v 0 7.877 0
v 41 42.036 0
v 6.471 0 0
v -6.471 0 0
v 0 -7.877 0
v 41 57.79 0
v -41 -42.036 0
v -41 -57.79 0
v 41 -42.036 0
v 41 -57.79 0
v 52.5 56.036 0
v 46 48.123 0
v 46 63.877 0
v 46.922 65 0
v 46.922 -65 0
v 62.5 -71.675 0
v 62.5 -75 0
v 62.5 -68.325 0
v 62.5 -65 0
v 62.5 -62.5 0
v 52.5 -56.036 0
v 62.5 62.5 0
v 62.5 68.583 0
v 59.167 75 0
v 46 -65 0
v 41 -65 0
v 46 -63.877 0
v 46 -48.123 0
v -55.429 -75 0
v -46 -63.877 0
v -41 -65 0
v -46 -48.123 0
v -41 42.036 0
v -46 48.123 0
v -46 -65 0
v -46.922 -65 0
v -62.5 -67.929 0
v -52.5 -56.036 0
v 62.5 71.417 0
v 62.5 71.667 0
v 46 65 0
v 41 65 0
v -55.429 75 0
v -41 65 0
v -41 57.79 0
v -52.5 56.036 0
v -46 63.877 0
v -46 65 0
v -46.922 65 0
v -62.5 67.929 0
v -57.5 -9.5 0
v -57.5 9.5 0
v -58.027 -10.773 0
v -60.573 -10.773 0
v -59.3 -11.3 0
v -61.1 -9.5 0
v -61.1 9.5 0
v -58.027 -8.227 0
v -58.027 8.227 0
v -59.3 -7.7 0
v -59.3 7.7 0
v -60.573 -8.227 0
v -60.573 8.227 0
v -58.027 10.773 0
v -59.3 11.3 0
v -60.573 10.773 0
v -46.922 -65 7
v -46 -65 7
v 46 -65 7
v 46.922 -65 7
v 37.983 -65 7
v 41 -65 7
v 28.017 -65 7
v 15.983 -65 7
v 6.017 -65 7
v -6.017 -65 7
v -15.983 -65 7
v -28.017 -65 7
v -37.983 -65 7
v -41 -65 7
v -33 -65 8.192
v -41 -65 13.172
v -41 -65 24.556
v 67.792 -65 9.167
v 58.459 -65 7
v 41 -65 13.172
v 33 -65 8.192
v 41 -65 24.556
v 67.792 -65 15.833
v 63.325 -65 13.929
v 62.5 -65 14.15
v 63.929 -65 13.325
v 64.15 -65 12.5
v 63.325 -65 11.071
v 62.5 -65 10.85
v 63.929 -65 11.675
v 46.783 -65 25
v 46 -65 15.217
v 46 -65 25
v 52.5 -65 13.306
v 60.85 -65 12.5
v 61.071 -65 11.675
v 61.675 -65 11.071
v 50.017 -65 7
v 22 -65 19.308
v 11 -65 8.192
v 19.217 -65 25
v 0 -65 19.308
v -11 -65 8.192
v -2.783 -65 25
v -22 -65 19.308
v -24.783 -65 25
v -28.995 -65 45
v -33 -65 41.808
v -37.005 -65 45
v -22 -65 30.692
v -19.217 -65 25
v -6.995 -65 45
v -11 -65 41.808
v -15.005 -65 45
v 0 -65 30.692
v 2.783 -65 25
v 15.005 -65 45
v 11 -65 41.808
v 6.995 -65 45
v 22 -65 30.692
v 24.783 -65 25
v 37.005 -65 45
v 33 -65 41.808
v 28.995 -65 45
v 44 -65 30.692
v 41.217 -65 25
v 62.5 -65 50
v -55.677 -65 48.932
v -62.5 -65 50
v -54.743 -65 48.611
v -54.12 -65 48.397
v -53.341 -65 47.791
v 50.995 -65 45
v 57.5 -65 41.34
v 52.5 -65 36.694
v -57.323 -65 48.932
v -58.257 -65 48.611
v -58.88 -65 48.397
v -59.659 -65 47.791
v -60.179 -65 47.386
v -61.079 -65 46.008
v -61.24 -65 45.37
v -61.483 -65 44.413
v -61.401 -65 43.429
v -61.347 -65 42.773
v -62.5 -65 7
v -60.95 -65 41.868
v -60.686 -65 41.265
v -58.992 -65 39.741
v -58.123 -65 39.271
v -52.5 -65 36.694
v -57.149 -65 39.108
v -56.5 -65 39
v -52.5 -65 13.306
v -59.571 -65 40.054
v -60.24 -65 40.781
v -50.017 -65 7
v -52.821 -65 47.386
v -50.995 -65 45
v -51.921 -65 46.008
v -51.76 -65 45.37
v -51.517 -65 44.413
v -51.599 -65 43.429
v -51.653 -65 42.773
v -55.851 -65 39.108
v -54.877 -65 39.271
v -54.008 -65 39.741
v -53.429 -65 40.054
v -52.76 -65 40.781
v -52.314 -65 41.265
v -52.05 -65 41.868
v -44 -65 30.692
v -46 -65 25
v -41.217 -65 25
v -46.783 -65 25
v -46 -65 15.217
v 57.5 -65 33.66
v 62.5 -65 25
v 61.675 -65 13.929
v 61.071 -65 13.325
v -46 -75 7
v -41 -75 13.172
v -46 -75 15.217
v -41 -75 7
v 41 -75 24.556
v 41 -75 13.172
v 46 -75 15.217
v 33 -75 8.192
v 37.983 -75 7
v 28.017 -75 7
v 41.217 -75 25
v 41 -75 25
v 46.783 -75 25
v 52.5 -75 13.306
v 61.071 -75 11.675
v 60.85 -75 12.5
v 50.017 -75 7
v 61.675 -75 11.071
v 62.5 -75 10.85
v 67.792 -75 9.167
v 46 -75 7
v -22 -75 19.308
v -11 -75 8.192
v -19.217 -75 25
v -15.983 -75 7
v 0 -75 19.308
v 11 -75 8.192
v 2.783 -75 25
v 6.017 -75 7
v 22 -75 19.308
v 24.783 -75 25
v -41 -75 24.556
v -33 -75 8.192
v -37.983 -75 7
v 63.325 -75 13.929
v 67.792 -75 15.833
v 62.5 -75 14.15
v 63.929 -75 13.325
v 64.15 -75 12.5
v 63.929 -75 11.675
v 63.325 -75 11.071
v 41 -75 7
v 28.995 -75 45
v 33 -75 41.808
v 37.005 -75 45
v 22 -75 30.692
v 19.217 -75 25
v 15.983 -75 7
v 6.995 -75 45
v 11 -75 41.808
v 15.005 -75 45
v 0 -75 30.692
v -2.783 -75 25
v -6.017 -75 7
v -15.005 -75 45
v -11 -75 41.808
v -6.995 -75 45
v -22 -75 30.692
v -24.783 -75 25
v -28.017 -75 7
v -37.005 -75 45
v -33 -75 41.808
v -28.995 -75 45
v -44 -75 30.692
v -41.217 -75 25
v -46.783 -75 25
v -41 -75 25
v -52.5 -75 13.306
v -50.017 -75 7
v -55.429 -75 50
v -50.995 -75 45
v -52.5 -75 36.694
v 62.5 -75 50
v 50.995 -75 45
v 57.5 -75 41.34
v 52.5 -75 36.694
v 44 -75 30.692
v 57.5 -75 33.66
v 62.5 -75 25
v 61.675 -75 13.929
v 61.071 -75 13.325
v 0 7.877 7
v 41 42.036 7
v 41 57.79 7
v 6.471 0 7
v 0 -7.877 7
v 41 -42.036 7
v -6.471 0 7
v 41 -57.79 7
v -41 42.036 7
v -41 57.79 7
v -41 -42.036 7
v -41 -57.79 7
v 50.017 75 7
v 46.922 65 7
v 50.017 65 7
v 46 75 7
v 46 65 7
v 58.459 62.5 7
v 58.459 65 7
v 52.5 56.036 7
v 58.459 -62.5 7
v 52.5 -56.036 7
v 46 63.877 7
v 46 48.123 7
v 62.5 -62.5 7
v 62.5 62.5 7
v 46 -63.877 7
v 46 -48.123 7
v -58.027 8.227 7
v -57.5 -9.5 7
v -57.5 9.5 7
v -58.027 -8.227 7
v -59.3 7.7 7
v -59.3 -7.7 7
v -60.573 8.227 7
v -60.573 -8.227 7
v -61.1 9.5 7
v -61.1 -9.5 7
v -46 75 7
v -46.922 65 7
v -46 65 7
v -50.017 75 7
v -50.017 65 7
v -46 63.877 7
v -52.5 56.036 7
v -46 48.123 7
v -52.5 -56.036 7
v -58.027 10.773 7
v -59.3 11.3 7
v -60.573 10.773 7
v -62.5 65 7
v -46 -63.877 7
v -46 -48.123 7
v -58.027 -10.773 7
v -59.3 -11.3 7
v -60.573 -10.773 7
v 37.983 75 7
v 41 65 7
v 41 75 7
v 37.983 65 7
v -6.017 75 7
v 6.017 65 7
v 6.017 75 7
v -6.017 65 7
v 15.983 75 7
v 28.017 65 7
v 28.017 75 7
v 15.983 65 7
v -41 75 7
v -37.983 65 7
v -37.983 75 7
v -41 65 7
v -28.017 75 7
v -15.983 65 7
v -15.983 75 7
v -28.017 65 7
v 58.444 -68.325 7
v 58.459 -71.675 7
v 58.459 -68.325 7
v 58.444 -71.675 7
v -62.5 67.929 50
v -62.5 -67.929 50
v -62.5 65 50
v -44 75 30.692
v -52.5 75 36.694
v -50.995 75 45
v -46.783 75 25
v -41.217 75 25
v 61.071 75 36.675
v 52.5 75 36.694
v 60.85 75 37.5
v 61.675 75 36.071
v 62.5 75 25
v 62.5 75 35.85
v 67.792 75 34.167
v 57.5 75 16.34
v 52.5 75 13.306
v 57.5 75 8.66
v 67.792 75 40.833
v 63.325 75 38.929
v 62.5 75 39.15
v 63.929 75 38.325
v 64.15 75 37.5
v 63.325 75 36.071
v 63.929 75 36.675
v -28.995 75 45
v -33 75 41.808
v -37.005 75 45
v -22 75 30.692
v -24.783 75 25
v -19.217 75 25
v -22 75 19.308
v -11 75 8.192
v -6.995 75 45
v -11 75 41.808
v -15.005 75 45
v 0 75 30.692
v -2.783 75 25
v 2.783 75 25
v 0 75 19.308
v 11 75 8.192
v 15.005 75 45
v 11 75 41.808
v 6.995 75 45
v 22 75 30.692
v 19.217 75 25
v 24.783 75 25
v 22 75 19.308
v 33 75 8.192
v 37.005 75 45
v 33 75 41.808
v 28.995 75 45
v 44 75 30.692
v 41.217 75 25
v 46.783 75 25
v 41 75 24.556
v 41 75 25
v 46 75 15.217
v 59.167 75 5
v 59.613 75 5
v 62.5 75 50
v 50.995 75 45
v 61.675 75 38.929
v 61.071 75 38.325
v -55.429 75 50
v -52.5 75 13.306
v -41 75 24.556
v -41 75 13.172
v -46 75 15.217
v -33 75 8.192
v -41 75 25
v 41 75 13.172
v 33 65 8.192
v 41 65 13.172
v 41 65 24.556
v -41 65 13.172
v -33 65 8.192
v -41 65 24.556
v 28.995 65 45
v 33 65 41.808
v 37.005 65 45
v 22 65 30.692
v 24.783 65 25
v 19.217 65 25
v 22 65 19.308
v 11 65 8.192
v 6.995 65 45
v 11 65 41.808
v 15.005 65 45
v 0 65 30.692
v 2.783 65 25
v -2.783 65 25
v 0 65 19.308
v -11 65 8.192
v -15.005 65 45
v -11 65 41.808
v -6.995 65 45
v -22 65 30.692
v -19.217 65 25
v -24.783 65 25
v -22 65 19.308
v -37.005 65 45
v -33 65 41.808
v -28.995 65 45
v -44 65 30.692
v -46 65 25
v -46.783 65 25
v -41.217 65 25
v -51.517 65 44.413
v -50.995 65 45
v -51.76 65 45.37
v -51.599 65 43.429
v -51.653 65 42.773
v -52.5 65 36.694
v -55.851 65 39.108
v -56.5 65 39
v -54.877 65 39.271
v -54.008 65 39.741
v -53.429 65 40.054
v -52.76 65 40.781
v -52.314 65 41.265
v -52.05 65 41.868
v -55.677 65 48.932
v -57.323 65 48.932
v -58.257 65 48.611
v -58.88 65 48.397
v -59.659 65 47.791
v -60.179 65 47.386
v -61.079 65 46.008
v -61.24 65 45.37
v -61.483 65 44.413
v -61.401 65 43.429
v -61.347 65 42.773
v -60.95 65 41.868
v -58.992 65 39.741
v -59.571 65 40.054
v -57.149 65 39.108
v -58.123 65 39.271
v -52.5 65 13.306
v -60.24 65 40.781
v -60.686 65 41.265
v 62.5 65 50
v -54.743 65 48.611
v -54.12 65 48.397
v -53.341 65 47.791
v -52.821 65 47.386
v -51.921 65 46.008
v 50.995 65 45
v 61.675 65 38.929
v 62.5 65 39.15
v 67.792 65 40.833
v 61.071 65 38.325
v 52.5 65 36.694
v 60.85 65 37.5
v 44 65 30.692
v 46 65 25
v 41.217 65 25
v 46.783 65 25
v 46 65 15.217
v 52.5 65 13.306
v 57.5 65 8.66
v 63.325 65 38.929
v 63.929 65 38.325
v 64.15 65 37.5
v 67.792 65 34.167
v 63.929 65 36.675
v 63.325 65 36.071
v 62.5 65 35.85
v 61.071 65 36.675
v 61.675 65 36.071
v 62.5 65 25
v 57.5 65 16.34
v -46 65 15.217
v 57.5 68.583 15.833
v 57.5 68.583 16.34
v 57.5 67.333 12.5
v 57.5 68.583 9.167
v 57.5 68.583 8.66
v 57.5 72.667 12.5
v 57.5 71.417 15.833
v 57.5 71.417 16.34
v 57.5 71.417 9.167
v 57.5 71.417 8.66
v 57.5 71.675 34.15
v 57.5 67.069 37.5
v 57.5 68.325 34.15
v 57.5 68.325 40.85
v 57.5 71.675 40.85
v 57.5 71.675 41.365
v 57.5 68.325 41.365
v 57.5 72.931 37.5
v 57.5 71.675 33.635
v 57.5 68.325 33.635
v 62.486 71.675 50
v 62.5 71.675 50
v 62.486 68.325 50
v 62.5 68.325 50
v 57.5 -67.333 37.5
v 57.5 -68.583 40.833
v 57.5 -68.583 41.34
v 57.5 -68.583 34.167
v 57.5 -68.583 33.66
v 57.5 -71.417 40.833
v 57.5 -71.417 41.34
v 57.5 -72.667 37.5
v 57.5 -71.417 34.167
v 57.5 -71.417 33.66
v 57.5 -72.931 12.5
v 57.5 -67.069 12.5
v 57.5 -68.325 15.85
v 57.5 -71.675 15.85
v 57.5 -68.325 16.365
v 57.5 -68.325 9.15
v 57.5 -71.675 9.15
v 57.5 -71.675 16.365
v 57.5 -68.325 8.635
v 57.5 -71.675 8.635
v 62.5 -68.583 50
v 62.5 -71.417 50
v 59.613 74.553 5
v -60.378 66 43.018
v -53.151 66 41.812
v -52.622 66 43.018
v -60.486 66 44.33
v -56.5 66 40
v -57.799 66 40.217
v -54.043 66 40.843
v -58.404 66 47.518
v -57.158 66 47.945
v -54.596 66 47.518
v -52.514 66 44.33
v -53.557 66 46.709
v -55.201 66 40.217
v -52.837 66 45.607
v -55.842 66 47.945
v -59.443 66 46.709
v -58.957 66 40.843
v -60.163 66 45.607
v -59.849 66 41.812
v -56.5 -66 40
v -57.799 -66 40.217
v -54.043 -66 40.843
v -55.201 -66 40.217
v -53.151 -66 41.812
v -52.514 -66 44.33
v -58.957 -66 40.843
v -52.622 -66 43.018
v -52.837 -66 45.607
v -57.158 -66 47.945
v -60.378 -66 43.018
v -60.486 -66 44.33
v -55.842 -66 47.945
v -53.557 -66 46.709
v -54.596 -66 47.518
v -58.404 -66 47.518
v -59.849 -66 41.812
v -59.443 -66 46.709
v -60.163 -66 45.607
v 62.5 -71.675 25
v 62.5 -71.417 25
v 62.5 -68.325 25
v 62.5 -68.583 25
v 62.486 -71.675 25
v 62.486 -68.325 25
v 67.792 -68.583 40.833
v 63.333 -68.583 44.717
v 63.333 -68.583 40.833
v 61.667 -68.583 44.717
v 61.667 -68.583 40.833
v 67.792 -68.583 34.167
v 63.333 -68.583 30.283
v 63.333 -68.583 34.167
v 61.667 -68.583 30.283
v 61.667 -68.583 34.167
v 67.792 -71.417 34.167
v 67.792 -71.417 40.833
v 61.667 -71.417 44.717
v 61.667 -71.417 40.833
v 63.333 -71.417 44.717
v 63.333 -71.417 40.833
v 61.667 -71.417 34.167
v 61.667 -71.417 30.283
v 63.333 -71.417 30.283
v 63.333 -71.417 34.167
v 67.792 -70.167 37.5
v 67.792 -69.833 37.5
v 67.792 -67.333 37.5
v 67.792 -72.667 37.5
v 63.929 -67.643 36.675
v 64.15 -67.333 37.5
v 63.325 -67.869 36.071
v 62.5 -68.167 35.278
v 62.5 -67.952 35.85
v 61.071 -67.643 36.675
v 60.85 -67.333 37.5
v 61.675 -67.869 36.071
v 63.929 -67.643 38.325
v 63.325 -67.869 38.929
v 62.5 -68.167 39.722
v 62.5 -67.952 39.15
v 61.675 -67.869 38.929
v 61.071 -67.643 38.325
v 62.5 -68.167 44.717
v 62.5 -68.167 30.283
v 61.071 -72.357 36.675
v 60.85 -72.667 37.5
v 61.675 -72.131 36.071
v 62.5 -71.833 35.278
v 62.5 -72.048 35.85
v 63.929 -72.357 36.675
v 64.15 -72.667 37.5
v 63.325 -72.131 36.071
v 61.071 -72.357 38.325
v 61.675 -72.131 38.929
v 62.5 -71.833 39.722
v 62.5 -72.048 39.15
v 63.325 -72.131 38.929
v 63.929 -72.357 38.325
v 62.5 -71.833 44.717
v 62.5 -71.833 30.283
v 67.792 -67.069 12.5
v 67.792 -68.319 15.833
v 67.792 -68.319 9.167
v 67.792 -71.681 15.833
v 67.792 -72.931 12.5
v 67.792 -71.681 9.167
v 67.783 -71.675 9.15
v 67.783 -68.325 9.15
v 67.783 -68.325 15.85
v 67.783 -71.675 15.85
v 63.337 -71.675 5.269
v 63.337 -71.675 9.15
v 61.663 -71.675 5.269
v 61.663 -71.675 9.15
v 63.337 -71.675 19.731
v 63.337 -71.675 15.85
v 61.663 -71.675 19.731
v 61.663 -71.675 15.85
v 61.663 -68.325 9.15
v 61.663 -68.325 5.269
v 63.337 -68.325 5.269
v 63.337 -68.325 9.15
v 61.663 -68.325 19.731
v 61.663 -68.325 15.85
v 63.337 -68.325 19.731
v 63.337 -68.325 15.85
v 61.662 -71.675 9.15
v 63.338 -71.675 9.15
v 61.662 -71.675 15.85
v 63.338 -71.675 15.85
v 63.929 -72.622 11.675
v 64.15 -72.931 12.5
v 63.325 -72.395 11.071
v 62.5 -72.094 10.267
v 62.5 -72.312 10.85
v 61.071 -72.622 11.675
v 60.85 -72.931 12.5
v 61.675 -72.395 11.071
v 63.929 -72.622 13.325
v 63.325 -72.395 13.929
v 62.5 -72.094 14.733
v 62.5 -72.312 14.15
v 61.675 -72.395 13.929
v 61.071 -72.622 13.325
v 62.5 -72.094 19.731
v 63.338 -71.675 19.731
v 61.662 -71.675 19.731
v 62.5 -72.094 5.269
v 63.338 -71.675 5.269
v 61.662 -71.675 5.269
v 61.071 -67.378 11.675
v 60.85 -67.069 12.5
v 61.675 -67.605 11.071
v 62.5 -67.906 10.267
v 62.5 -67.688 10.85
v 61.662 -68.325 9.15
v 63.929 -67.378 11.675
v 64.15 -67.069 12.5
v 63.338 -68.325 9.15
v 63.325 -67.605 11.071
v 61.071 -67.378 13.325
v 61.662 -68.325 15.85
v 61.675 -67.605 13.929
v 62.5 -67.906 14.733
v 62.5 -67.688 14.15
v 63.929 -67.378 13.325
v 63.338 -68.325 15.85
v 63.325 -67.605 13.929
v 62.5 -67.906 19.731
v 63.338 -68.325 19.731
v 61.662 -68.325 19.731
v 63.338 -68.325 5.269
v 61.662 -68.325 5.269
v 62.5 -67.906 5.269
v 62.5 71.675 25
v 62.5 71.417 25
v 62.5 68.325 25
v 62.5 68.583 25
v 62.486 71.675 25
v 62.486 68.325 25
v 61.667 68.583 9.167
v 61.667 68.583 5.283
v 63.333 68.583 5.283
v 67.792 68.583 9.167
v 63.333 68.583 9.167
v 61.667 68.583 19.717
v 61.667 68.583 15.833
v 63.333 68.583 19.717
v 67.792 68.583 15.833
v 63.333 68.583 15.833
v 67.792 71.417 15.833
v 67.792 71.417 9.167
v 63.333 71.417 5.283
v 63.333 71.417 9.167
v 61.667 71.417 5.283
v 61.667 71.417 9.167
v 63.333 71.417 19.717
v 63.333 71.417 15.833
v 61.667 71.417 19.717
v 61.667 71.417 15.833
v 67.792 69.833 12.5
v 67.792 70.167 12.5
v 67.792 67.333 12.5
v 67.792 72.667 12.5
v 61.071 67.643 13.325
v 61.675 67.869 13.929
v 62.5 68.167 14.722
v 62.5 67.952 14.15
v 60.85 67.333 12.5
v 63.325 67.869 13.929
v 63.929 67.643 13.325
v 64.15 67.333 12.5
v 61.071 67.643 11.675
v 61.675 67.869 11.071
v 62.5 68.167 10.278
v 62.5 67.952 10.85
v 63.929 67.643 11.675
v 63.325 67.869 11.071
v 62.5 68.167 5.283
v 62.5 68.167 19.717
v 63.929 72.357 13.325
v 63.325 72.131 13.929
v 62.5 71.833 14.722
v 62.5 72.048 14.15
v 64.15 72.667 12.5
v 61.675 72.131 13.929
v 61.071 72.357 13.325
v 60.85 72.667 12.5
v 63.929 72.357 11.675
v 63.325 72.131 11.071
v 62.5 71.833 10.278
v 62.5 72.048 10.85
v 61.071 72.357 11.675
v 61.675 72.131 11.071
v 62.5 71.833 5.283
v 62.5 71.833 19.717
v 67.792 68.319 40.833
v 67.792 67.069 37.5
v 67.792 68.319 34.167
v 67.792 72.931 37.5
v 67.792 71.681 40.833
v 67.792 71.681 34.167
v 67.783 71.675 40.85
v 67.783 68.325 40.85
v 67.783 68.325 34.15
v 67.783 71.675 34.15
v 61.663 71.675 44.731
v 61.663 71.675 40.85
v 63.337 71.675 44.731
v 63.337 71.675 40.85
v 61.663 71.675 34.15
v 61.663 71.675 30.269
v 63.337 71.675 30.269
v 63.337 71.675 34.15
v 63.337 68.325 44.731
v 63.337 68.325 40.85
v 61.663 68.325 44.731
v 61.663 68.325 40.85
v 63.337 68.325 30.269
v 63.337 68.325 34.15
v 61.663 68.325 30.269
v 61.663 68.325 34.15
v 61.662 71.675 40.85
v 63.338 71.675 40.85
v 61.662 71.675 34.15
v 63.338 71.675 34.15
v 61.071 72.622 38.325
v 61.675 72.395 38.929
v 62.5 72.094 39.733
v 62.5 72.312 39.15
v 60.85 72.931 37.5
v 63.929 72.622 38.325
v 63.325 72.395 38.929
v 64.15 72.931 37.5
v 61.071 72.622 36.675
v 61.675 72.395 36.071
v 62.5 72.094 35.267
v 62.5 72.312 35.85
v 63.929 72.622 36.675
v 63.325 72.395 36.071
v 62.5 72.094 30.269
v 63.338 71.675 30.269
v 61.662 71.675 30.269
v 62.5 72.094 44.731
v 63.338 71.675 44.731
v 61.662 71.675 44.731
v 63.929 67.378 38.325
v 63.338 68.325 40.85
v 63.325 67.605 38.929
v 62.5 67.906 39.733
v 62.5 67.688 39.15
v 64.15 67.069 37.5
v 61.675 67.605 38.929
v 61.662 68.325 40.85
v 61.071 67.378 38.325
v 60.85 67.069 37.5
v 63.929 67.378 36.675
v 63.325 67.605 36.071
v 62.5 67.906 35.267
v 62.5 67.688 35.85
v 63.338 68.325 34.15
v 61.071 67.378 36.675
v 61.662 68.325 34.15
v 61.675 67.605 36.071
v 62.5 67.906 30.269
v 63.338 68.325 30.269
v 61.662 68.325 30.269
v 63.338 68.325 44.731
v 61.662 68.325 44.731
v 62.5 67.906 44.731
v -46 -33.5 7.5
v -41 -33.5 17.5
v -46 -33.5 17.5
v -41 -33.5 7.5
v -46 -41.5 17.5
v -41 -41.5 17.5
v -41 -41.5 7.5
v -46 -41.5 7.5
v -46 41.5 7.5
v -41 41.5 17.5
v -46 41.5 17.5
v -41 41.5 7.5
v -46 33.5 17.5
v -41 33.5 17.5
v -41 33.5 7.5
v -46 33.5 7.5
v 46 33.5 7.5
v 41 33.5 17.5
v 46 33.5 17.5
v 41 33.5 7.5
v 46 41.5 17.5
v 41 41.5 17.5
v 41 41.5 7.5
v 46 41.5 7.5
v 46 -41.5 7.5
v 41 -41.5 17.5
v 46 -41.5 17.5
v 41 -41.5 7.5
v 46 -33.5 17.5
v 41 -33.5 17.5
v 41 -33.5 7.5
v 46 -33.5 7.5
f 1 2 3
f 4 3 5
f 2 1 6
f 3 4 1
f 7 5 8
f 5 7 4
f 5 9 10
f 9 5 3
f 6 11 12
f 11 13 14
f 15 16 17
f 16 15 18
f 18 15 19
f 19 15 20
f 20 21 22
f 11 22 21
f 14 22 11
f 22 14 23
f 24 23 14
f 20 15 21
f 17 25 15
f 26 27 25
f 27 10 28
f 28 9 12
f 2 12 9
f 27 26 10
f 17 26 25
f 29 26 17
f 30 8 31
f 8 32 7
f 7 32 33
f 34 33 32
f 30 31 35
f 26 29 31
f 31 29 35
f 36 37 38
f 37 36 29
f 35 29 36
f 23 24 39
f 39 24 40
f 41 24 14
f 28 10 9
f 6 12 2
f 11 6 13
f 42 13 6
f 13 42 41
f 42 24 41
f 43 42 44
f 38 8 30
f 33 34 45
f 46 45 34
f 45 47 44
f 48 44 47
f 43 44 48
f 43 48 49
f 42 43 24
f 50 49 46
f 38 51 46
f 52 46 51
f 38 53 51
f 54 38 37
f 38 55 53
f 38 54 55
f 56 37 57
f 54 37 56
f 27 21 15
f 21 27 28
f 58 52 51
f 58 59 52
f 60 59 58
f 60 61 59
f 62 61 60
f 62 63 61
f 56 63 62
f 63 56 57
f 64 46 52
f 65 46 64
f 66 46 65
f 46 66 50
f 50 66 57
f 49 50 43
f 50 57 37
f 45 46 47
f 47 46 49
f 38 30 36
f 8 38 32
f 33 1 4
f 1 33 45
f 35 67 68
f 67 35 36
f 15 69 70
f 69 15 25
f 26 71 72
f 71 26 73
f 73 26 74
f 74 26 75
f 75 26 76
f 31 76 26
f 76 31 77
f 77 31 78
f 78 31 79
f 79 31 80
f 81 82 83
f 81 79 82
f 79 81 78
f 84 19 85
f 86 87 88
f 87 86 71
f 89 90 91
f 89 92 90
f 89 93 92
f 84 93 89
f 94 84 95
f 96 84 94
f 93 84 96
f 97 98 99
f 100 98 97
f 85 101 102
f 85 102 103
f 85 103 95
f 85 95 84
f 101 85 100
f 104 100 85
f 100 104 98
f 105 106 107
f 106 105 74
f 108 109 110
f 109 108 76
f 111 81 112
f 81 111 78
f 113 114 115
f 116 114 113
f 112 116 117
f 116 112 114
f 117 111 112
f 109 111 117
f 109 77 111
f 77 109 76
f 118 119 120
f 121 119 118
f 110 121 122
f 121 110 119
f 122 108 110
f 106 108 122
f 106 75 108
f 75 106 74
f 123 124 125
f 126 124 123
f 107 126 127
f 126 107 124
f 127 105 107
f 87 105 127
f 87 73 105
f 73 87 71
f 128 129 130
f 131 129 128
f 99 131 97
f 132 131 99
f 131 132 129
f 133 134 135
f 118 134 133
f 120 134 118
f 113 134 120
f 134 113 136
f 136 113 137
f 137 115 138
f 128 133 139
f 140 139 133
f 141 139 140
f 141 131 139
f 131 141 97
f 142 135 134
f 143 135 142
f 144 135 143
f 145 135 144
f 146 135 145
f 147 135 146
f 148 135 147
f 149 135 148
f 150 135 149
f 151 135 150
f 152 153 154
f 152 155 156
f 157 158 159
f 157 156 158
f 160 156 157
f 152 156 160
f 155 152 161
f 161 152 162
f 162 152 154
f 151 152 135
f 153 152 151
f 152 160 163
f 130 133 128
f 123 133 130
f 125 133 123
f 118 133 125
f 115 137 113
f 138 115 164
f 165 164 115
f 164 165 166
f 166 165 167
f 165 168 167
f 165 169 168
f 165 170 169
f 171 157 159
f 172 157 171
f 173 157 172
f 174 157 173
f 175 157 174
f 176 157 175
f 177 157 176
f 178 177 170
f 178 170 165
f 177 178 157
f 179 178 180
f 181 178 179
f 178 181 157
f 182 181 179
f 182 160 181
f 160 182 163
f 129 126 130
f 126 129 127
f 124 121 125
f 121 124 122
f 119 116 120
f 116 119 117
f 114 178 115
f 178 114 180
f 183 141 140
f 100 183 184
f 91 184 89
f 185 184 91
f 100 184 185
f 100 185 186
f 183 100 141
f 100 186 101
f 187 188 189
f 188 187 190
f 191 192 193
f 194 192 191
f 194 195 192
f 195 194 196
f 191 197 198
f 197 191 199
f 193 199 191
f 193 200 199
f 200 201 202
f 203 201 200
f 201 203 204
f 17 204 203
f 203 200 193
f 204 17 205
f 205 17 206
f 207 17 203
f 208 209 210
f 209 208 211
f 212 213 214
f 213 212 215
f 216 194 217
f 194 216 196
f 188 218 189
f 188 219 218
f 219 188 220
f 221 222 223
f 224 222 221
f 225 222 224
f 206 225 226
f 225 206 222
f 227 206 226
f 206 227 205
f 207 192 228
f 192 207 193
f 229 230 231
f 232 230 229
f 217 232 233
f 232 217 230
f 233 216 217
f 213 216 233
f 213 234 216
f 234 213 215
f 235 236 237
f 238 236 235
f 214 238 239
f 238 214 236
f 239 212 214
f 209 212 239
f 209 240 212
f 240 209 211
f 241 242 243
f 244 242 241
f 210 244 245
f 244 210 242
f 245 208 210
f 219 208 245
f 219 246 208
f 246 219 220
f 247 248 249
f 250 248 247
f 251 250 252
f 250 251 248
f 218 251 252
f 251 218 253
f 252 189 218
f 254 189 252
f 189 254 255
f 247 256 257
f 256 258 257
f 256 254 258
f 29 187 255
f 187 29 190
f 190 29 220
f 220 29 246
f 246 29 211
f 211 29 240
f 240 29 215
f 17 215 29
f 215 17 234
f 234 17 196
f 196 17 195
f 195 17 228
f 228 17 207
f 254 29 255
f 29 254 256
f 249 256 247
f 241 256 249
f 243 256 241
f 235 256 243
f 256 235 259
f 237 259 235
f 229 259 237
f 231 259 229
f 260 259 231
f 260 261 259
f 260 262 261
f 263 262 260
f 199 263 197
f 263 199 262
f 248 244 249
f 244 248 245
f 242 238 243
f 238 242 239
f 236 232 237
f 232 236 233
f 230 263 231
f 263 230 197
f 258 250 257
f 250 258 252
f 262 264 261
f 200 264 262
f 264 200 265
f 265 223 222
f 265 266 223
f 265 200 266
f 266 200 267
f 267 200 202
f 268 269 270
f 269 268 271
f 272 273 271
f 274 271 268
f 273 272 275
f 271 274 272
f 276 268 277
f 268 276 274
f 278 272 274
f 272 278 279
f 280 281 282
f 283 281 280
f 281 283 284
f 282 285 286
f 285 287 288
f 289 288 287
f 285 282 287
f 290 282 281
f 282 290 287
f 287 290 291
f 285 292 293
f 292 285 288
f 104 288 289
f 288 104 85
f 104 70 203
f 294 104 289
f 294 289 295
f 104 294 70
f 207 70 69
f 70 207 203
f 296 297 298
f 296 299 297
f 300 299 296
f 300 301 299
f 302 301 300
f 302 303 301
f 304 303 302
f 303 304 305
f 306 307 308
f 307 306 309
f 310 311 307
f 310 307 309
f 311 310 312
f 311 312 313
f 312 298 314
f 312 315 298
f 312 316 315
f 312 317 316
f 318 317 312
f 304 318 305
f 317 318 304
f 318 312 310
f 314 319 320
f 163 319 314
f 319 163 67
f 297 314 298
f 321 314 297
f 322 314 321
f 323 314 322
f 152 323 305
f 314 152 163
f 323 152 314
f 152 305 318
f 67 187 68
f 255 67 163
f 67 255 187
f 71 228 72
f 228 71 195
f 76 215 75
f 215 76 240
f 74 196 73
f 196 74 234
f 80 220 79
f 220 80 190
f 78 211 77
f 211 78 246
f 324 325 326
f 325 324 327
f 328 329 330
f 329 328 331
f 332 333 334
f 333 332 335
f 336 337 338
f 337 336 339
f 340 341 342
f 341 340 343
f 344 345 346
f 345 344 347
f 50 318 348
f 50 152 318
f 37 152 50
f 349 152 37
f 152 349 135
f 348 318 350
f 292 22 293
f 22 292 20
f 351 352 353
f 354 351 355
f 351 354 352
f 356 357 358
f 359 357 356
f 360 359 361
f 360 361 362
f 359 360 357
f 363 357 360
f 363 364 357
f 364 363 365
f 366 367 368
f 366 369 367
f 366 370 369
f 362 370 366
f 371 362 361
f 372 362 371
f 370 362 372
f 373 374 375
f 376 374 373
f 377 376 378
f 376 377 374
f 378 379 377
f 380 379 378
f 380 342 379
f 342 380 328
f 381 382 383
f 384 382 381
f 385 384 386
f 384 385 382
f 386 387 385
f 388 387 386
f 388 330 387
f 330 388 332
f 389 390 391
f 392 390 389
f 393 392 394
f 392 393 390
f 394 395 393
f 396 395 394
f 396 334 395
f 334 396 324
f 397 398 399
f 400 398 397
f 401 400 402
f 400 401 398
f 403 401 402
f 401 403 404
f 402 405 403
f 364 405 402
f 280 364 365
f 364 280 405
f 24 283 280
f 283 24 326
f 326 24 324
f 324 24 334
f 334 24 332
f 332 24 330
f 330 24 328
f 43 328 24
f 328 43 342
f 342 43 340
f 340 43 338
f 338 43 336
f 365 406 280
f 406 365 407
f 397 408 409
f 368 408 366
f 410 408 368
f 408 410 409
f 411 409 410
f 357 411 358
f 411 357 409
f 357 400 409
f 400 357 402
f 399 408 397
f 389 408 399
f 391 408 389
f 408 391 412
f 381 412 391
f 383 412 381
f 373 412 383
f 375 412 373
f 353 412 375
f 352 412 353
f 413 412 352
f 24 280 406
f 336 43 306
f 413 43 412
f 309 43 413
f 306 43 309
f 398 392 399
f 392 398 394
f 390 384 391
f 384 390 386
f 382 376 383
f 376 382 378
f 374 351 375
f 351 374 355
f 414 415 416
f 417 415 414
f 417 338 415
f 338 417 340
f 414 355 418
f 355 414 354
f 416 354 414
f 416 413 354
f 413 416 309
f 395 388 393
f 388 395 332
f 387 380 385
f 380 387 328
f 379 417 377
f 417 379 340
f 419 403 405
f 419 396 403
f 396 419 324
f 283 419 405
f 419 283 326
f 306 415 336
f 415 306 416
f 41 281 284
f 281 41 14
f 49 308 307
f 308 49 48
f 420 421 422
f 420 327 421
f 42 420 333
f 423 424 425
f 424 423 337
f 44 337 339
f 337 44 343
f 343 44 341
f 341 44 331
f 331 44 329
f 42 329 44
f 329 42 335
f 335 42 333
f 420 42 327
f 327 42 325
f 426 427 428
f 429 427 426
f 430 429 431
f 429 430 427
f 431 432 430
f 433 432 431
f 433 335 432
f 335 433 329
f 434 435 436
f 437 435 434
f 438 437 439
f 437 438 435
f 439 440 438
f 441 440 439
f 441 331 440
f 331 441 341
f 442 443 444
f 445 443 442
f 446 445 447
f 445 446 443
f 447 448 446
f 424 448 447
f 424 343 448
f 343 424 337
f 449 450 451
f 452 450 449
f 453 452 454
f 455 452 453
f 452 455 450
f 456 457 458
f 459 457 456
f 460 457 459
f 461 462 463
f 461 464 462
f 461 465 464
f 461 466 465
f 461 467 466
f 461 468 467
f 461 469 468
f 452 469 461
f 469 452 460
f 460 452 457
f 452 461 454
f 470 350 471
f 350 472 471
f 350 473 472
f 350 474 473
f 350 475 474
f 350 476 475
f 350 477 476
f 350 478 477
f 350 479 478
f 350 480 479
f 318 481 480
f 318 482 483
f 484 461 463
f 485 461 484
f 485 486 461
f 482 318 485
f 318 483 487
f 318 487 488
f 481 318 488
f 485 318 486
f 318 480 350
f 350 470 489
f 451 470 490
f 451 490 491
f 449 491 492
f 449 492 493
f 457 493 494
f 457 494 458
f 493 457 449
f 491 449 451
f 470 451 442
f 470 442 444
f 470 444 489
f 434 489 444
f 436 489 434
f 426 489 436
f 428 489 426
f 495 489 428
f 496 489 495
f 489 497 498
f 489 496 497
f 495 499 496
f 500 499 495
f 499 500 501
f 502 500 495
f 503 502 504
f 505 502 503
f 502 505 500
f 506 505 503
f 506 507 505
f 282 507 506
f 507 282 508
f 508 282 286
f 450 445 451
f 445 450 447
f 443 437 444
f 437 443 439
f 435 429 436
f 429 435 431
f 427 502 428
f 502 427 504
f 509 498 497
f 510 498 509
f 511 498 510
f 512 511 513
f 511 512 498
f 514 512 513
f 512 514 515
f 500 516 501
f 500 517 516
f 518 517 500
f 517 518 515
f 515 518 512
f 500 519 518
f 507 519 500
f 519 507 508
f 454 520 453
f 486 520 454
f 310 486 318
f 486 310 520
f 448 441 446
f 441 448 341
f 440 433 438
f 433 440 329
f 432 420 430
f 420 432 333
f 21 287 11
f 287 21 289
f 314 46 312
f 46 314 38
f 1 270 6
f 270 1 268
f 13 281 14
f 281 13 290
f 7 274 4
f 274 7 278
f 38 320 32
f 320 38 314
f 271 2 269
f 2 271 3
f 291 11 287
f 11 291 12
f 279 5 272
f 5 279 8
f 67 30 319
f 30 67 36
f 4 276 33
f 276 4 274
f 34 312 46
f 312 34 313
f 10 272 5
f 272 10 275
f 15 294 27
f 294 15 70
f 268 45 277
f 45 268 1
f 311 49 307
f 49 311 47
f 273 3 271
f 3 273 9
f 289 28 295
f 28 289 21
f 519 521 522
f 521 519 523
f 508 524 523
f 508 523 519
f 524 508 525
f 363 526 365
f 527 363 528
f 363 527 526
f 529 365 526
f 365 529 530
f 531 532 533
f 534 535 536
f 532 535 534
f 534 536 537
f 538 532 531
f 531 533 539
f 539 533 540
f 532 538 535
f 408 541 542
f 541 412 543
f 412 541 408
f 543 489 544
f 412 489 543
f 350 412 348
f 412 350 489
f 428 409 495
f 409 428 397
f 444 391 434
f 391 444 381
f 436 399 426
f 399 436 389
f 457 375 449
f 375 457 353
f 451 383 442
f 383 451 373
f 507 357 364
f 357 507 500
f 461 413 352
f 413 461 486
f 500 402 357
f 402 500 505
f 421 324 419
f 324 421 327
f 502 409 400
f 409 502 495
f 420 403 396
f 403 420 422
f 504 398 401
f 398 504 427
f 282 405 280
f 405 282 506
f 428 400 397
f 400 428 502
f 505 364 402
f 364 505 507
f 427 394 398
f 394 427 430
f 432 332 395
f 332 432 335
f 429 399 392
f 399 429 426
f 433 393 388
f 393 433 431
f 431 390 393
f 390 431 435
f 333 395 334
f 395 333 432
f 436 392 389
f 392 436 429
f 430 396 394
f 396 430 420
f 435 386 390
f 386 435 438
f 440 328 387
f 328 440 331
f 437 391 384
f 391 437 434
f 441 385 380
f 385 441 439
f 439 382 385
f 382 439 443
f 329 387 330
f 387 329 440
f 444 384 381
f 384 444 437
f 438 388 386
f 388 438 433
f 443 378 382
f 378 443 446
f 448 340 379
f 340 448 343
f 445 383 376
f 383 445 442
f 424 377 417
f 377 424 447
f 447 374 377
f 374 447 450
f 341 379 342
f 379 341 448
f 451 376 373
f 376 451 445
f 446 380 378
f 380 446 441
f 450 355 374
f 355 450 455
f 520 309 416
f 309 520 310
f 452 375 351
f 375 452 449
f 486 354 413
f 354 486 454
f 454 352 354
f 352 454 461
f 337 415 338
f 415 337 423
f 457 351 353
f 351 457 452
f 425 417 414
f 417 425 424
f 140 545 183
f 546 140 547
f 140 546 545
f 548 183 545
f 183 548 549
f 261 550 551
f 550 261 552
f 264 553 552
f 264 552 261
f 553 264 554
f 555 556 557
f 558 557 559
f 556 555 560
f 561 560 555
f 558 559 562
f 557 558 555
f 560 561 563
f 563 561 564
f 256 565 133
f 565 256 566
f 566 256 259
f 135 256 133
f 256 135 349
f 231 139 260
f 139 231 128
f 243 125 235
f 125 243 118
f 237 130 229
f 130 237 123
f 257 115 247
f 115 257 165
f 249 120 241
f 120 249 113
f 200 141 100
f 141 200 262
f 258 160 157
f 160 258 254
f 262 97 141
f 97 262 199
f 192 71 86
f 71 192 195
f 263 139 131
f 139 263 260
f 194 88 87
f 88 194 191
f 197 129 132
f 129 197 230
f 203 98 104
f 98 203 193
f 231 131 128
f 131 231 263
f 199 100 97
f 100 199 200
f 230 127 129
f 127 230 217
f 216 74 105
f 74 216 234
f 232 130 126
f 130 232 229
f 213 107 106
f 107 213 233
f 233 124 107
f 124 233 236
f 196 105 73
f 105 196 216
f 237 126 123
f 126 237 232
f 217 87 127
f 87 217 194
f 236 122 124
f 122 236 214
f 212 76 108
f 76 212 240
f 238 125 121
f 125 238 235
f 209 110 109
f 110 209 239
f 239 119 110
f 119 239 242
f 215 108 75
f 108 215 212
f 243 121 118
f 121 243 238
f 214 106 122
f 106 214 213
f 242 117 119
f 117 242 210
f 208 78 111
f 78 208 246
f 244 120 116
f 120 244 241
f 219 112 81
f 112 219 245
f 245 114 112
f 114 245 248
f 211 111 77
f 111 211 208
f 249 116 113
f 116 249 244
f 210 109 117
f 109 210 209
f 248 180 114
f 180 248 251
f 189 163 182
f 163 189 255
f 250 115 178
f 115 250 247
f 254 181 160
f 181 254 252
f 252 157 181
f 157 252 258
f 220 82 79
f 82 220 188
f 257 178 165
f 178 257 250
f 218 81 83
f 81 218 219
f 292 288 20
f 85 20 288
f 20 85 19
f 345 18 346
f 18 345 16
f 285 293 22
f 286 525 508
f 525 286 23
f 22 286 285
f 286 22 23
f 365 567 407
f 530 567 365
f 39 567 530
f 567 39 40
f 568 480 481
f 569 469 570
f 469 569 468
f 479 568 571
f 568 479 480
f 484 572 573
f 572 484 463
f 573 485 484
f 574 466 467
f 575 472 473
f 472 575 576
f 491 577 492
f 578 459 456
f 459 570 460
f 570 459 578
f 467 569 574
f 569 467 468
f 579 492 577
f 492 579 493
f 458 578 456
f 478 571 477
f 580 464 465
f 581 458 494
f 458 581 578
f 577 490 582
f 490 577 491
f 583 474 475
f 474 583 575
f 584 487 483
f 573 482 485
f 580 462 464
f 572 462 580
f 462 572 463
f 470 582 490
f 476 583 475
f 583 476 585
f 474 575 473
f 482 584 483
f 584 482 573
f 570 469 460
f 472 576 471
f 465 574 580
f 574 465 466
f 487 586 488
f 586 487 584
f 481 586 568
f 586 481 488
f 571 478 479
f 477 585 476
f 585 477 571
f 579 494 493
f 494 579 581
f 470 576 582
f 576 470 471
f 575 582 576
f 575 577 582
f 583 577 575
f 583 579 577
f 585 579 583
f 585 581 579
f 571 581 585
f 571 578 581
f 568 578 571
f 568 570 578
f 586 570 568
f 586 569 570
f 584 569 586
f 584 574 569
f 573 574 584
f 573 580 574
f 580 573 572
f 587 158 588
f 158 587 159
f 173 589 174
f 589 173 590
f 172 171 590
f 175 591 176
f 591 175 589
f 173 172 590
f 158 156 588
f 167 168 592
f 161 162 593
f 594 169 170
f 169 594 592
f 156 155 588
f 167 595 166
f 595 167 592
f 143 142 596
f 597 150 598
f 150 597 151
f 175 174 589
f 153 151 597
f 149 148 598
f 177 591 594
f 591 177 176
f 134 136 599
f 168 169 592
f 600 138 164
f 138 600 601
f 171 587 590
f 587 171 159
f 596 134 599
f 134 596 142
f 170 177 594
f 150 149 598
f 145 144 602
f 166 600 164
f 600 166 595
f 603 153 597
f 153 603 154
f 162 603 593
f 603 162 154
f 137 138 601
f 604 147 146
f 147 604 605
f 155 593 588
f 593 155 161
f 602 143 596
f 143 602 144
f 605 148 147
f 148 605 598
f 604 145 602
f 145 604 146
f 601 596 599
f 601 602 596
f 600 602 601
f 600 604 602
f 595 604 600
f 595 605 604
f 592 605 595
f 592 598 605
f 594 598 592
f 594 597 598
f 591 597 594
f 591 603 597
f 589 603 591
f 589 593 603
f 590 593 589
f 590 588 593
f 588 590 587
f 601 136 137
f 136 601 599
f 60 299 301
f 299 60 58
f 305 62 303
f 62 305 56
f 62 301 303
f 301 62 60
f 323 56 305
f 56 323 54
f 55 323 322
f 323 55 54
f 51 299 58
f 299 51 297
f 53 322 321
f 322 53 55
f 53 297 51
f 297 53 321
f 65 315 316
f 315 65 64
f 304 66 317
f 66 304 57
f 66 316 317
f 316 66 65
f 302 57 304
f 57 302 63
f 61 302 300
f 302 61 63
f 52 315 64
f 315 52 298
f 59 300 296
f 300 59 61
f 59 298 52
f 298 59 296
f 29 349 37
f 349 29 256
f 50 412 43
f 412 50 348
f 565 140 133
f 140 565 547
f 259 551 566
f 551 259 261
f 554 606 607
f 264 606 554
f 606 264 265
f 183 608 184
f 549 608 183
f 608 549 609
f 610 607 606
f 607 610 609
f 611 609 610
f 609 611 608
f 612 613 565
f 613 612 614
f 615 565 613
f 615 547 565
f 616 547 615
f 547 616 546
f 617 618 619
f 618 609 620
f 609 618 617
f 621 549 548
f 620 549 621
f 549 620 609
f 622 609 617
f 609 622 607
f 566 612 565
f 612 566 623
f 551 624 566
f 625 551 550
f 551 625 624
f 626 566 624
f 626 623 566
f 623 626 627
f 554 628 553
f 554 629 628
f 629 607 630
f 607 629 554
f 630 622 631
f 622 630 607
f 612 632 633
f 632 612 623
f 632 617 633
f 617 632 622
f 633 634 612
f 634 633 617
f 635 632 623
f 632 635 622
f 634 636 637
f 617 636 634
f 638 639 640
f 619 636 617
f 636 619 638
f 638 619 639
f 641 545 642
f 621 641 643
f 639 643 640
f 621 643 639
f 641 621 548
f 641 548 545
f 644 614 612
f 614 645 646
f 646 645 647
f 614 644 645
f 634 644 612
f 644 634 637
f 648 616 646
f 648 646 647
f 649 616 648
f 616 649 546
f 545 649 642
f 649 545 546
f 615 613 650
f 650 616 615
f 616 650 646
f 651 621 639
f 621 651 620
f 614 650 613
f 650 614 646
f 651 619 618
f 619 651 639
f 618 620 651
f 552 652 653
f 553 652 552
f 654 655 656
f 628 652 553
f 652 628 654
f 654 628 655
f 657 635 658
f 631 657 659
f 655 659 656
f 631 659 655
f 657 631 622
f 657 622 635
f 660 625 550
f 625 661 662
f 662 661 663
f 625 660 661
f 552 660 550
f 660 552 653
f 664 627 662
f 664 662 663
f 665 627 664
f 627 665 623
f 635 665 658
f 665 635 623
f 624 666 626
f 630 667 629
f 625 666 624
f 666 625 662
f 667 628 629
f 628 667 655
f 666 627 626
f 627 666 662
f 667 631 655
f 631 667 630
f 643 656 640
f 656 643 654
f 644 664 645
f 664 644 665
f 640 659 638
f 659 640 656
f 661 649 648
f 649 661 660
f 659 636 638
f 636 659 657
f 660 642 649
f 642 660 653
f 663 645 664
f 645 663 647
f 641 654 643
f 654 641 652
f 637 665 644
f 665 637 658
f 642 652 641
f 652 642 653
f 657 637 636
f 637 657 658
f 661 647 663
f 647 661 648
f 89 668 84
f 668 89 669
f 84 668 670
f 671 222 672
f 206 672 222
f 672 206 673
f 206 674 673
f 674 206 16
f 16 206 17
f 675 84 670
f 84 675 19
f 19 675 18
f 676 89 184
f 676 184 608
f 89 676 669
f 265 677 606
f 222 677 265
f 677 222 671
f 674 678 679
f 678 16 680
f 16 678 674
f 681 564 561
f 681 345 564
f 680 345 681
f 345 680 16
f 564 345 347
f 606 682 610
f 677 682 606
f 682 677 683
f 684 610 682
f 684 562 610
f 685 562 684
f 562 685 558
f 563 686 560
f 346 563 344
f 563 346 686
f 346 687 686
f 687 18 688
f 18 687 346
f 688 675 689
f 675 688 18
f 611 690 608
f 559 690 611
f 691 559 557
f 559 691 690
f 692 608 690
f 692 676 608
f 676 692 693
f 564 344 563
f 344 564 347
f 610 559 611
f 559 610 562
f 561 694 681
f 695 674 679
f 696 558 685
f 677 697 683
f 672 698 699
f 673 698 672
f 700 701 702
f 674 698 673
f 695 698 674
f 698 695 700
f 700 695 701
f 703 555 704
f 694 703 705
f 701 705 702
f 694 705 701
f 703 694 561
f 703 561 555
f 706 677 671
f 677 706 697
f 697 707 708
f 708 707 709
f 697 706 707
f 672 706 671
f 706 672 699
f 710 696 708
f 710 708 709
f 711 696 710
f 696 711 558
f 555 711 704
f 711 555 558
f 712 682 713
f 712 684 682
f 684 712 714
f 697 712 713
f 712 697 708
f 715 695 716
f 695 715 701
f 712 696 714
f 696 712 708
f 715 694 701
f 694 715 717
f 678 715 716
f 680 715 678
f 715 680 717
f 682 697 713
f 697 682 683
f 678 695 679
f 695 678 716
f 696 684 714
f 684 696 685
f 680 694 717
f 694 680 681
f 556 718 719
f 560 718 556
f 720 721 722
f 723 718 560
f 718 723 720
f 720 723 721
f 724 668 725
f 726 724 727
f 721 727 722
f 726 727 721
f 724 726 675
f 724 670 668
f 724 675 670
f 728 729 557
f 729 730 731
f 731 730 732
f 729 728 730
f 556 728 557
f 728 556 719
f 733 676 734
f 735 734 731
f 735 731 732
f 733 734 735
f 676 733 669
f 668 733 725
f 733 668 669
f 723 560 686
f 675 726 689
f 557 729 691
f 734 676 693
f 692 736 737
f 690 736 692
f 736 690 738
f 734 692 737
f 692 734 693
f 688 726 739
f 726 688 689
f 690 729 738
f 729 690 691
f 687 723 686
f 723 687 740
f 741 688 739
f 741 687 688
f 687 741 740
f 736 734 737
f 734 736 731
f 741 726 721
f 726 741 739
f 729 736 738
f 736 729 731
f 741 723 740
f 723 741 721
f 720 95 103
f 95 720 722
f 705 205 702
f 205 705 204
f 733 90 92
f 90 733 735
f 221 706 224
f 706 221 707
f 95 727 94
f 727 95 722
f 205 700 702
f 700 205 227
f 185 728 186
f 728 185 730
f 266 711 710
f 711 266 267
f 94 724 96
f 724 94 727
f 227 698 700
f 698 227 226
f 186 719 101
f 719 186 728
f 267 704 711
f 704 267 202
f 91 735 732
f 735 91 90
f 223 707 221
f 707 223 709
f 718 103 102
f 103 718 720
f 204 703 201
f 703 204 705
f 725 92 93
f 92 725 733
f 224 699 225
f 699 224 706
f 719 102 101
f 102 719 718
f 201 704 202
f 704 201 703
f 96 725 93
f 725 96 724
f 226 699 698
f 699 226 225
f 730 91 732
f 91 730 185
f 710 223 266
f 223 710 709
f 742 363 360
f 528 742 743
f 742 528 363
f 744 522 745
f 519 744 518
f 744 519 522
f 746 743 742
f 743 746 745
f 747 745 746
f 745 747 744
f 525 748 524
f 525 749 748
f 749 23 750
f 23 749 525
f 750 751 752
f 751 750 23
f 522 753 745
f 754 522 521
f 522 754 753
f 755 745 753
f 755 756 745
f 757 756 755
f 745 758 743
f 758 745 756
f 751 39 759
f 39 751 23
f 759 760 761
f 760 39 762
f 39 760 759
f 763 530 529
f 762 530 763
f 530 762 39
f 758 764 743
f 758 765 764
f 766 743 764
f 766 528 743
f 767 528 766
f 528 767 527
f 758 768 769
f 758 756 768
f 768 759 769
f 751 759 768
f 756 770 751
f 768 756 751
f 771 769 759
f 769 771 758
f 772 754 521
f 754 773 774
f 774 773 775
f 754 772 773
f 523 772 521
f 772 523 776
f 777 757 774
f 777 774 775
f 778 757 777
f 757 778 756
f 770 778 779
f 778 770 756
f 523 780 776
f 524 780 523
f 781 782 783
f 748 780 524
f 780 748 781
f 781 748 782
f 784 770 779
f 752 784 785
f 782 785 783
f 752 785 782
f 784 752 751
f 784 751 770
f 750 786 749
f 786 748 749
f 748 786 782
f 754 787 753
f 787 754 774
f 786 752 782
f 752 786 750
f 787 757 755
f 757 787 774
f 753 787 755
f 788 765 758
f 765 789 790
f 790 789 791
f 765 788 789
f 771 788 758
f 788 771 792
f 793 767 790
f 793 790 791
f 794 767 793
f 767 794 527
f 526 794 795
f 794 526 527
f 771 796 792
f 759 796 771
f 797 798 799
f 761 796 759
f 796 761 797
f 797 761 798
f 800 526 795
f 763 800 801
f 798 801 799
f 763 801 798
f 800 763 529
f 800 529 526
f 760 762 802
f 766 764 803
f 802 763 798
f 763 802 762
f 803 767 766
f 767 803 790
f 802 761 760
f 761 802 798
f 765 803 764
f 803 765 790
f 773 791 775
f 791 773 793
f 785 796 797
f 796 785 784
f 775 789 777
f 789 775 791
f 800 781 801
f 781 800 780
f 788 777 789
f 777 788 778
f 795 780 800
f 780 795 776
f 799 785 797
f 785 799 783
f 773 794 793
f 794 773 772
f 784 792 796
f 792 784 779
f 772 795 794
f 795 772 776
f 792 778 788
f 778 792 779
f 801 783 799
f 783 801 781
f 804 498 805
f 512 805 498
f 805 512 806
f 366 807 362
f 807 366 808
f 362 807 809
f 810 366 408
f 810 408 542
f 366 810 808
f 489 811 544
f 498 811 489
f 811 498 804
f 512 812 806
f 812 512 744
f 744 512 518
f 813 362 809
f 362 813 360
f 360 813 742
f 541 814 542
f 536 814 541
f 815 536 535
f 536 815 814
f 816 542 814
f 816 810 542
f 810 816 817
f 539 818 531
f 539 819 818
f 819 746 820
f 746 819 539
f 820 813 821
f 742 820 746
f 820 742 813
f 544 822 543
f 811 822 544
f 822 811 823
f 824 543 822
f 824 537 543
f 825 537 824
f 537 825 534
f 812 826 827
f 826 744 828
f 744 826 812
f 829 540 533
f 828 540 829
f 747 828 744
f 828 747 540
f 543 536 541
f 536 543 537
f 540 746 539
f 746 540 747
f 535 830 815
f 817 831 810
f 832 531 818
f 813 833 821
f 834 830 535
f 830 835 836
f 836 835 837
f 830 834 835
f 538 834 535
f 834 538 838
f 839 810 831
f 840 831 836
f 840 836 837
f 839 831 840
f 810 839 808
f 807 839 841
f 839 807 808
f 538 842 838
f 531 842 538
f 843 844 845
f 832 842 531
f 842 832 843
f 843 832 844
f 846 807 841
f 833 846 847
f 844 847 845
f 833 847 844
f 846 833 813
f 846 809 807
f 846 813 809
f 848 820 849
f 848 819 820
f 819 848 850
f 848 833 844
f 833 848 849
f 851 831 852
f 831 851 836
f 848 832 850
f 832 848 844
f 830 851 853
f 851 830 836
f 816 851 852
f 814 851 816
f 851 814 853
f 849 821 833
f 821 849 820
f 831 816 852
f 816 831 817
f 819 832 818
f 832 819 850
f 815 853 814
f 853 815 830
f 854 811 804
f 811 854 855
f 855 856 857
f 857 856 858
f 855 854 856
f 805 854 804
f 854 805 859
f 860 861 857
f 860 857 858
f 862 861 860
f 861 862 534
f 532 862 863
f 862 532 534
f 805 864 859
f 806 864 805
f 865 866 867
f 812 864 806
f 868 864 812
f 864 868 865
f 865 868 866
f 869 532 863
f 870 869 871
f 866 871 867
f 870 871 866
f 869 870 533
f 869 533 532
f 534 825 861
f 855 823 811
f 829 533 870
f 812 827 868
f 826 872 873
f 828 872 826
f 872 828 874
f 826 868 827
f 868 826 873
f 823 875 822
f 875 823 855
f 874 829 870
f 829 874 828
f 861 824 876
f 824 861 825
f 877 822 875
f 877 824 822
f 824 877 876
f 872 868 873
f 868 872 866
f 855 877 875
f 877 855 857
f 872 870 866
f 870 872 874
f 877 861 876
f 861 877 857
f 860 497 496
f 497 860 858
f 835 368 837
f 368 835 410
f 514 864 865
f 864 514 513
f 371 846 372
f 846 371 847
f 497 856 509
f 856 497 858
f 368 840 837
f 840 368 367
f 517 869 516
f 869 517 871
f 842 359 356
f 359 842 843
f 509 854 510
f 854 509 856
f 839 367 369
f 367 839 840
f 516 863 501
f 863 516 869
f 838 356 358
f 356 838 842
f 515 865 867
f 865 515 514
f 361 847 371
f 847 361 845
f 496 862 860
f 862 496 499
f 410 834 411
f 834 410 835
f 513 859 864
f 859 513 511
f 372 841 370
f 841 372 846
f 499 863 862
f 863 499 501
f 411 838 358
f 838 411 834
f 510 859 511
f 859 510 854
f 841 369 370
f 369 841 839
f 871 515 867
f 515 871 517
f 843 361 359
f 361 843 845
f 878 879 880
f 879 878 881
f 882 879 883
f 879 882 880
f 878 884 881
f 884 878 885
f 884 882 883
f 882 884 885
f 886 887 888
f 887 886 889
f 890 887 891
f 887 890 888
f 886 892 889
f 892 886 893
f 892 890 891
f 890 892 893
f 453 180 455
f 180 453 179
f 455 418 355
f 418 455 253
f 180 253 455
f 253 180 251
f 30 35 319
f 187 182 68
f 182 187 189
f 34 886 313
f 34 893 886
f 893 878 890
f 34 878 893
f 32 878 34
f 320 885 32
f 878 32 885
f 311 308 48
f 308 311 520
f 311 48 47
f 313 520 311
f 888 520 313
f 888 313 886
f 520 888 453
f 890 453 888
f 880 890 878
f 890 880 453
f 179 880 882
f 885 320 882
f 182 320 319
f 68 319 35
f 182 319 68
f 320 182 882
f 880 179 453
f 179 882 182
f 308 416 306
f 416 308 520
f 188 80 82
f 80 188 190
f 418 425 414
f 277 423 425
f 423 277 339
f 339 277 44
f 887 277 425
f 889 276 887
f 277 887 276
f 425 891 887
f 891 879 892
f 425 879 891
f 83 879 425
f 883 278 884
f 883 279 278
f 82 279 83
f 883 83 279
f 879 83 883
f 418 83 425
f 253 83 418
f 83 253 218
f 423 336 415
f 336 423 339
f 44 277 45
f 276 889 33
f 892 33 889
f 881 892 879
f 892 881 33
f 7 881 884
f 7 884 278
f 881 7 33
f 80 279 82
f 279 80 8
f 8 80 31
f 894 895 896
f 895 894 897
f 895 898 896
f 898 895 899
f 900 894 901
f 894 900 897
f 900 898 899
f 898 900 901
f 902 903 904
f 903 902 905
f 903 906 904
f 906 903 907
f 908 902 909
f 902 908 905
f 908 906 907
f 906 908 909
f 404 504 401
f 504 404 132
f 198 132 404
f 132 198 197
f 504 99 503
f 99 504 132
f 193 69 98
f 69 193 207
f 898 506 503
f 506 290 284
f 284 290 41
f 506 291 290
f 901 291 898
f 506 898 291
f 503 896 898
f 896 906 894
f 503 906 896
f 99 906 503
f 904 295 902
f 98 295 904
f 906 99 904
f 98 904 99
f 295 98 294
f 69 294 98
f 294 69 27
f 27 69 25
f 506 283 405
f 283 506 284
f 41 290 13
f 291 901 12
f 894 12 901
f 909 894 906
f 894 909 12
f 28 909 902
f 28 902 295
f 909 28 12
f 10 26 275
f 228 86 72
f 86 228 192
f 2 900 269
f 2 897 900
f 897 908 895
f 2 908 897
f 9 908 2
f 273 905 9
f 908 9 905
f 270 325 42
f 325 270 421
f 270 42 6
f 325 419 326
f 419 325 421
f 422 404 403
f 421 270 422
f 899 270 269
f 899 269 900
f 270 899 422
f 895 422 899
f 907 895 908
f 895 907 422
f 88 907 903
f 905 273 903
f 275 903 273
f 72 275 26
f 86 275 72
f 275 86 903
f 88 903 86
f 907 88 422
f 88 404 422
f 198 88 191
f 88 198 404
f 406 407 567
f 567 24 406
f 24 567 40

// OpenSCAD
// file: joiners.scad
include <config.scad>
use <GDMUtils.scad>


module half_joiner_clear(h=20, w=10, a=30)
{
	dmnd_height = h*1.0;
	dmnd_width = dmnd_height*tan(a);
	guide_size = w/3;
	guide_width = 2*(dmnd_height/2-guide_size)*tan(a);

	difference() {
		// Diamonds.
		scale([w, dmnd_width/2, dmnd_height/2]) {
			xrot(45) cube(size=[1,sqrt(2),sqrt(2)], center=true);
		}
		// Blunt point of tab.
		grid_of(ya=[-(guide_width/2+2), (guide_width/2+2)]) {
			cube(size=[w*1.05, 4, guide_size*2], center=true);
		}
	}
}
//half_joiner_clear();



module half_joiner(h=20, w=10, l=10, a=30, screwsize=3, guides=true, slop=printer_slop)
{
	dmnd_height = h*1.0;
	dmnd_width = dmnd_height*tan(a);
	guide_size = w/3;
	guide_width = 2*(dmnd_height/2-guide_size)*tan(a);

	difference() {
		union() {
			// Make base.
			difference() {
				// Solid backing base.
				translate([0,-l/2,0])
					cube(size=[w, l, h], center=true);

				// Clear diamond for tab
				half_joiner_clear(h=h, w=w+0.05, a=a);
			}

			difference() {
				// Make tab
				scale([w/3-slop*2, dmnd_width/2, dmnd_height/2]) xrot(45)
					cube(size=[1,sqrt(2),sqrt(2)], center=true);

				// Blunt point of tab.
				translate([0,guide_width/2+2,0])
					cube(size=[w*0.99,4,guide_size*2], center=true);
			}


			// Guide ridges.
			if (guides == true) {
				grid_of(xa=[-(w/6-slop), (w/6-slop)]) {
					// Guide ridge.
					scale([0.75, 1, 2]) yrot(45)
						cube(size=[guide_size/sqrt(2), guide_width, guide_size/sqrt(2)], center=true);

					// Snap ridge.
					scale([0.25, 0.5, 1]) zrot(45)
						cube(size=[guide_size/sqrt(2), guide_size/sqrt(2), dmnd_width], center=true);
				}
			}
		}

		// Make screwholes, if needed.
		if (screwsize != undef) {
			yrot(90) cylinder(r=screwsize*1.1/2, h=w+1, center=true, $fn=12);
		}
	}
}
//half_joiner(screwsize=3);



module half_joiner2(h=20, w=10, l=10, a=30, screwsize=3, guides=true)
{
	difference() {
		union () {
			translate([0,-l/2,0])
				cube(size=[w, l, h], center=true);
			half_joiner_clear(h=h, w=w, a=a);
		}

		// Subtract mated half_joiner.
		zrot(180) half_joiner(h=h+0.05, w=w+0.05, l=l+0.05, a=a, screwsize=undef, guides=guides, slop=0.0);

		// Make screwholes, if needed.
		if (screwsize != undef) {
			yrot(90) cylinder(r=screwsize*1.1/2, h=w+1, center=true, $fn=12);
		}
	}
}
//half_joiner2(screwsize=3);



module joiner(h=40, w=10, l=10, a=30, screwsize=3, guides=true, slop=printer_slop)
{
	render(convexity=10) union() {
		translate([0,0,h/4])
			half_joiner(h=h/2, w=w, l=l, a=a, screwsize=screwsize, guides=guides, slop=slop);
		translate([0,0,-h/4])
			half_joiner2(h=h/2, w=w, l=l, a=a, screwsize=screwsize, guides=guides);
	}
}
//joiner(screwsize=3);



module joiner_clear(h=40, w=10, a=30)
{
	grid_of(za=[-h/4,h/4]) {
		half_joiner_clear(h=h/2.0, w=w, a=a);
	}
}
//joiner_clear();



module joiner_pair(spacing=100, h=40, w=10, l=10, a=30, screwsize=3, guides=true)
{
	yrot_copies([0,180]) {
		translate([spacing/2, 0, 0]) {
			joiner(h=h, w=w, l=l, a=a, screwsize=screwsize, guides=guides);
		}
	}
}
//joiner_pair(spacing=100, h=40, w=10, l=10, a=30, screwsize=3, guides=true);



module joiner_pair_clear(spacing=100, h=40, w=10, a=30)
{
	yrot_copies([0,180]) {
		translate([spacing/2, 0, 0]) {
			joiner_clear(h=h, w=w, a=a);
		}
	}
}
//joiner_pair_clear(spacing=100, h=40, w=10, a=30);



module joiner_quad(xspacing=100, yspacing=50, h=40, w=10, l=10, a=30, screwsize=3, guides=true)
{
	zrot_copies([0,180]) {
		translate([0, yspacing/2, 0]) {
			joiner_pair(spacing=xspacing, h=h, w=w, l=l, a=a, screwsize=screwsize, guides=guides);
		}
	}
}
//joiner_quad(xspacing=100, yspacing=50, h=40, w=10, l=10, a=30, screwsize=3, guides=true);



module joiner_quad_clear(xspacing=100, yspacing=50, h=40, w=10, a=30)
{
	zrot_copies([0,180]) {
		translate([0, yspacing/2, 0]) {
			joiner_pair_clear(spacing=xspacing, h=h, w=w, a=a);
		}
	}
}
//joiner_quad_clear(xspacing=100, yspacing=50, h=40, w=10, a=30);



// vim: noexpandtab tabstop=4 shiftwidth=4 softtabstop=4 nowrap
// file: config.scad
snappy_version = 0.91;


// 0 = Thinning Walls (Thin in the middle, thick at edges.  Prettier smooth walls.)
// 1 = Corrugated walls. (Zig-zagged walls. Less shrinkage stress. Closed walls.)
// 2 = Crossbeam walls. (Open sparse struts. Far less shrinkage stress.)
wall_styling = 2;


platform_length = 100; // mm.  Must be a multiple of rack_tooth_size.
platform_width  = 150; // mm
platform_height =  40; // mm
platform_thick  =   7; // mm

rail_length   = 150;    // mm
rail_height   =  50;    // mm
rail_thick    =   7;    // mm
rail_offset   =  12;    // mm

motor_rail_length = 100; // mm
cantilever_length = 125; // mm

groove_angle  =  30;    // degrees
groove_height =  12;    // mm

joiner_angle  =  30;    // degrees
joiner_width  =  10;    // mm

rack_tooth_size  =  5; // mm per tooth.
set_screw_size   =  3; // mm size of set screw in drive gears, couplers, etc
motor_shaft_size =  5; // mm
motor_shaft_flatted = false;  // boolean. Set true if motor shaft has a flattened side.

// Currently configured for 3/8" ACME threaded rod and matching 11/16" nut
lifter_rod_diam    =   9.5; // mm
lifter_rod_length  = 300.0; // mm
lifter_nut_size    =  17.4; // mm
lifter_nut_thick   =   9.3; // mm
lifter_thread_size =   3.175; // mm lift per revolution

endstop_hole_spacing = 19;   // mm
endstop_hole_inset   =  3.2; // mm
endstop_hole_hoff    = 10;   // mm
endstop_click_voff   =  4;   // mm
endstop_screw_size   =  3;   // mm

// This is the slop needed to make parts fit more exactly, and may be
// printer dependant.  Printing a slop calibration plate should help
// dial this setting in for your printer.
printer_slop =   0.25; // mm



// Commonly used derived values.  Don't change these.
rail_spacing = platform_width - joiner_width*4 - 10;
rail_width = rail_spacing + joiner_width*2;
motor_mount_spacing=43+joiner_width+10;

wall_styles = ["thinwall", "corrugated", "crossbeams"];
wall_style = wall_styles[wall_styling];


// vim: noexpandtab tabstop=4 shiftwidth=4 softtabstop=4 nowrap
// main file
include <config.scad>
use <GDMUtils.scad>
use <joiners.scad>


module cantilever_arm()
{
	l = cantilever_length;
	w = platform_width;
	h = rail_height;

	color([0.9, 0.7, 1.0])
	render(convexity=20)
	difference() {
		union() {
			difference() {
				union() {
					// Bottom.
					translate([0,0,rail_thick/2]) yrot(90)
						sparse_strut(h=w, l=l, thick=rail_thick, maxang=45, strut=10, max_bridge=500);

					mirror_copy([1, 0, 0]) {
						// Walls.
						translate([(w-joiner_width)/2, 0, h/2]) {
							if (wall_style == "crossbeams")
								sparse_strut(h=h, l=l-10, thick=joiner_width, strut=5);
							if (wall_style == "thinwall")
								thinning_wall(h=h, l=l-10, thick=joiner_width, strut=rail_thick, bracing=false);
							if (wall_style == "corrugated")
								corrugated_wall(h=h, l=l-10, thick=joiner_width, strut=rail_thick);
						}

						//Back ends
						translate([(w-joiner_width)/2, l/2-2.5, h/2]) {
							cube(size=[joiner_width, 5, h], center=true);
						}
					}
				}

				// Clear space for joiners.
				translate([0, -l/2, h/2]) {
					zrot(180) joiner_pair_clear(spacing=w-joiner_width, h=h, w=joiner_width+5, a=joiner_angle);
				}

				// Pivot
				mirror_copy([1,0,0]) {
					translate([w/2-joiner_width, l/2-6, h-6]) {
						yrot(90) cylinder(h=2, r1=6, r2=4, center=true);
					}
				}

				// endstop screw holes.
				grid_of(
					xa=[-endstop_hole_spacing/2, endstop_hole_spacing/2],
					ya=[l/2-endstop_hole_inset],
					za=[rail_thick/2]
				) {
					cylinder(h=rail_thick+0.05, r=endstop_screw_size*1.2/2, center=true, $fn=8);
				}

				// Chamfer front corners.
				translate([0, l/2, h/2]) {
					grid_of(xa=[-w/2, w/2]) {
						zrot(45) cube(size=[10, 10, h+1], center=true);
					}
				}
			}

			// Snap-tab joiners.
			translate([0, -l/2, h/2]) {
				zrot(180) joiner_pair(spacing=w-joiner_width, h=h, w=joiner_width, l=5, a=joiner_angle);
			}

			zrot_copies([0, 180]) {
				translate([0, l/2-19, h/4]) {
					difference() {
						// Side supports.
						cube(size=[w, 5, h/2], center=true);

						// Wiring access holes.
						grid_of(xa=[-w/4, w/4])
							cube(size=[8, 6, 10], center=true);
					}
				}
			}
		}

		// Chamfer sharp joiner corner.
		translate([w/2, -l/2, 0]) {
			zrot(45) cube(size=[joiner_width/3*sqrt(2), joiner_width/3*sqrt(2), 10], center=true);
		}
	}
}
//!cantilever_arm();



module cantilever_arm_parts() { // make me
	zrot(90) cantilever_arm();
}



cantilever_arm_parts();



// vim: noexpandtab tabstop=4 shiftwidth=4 softtabstop=4 nowrap
